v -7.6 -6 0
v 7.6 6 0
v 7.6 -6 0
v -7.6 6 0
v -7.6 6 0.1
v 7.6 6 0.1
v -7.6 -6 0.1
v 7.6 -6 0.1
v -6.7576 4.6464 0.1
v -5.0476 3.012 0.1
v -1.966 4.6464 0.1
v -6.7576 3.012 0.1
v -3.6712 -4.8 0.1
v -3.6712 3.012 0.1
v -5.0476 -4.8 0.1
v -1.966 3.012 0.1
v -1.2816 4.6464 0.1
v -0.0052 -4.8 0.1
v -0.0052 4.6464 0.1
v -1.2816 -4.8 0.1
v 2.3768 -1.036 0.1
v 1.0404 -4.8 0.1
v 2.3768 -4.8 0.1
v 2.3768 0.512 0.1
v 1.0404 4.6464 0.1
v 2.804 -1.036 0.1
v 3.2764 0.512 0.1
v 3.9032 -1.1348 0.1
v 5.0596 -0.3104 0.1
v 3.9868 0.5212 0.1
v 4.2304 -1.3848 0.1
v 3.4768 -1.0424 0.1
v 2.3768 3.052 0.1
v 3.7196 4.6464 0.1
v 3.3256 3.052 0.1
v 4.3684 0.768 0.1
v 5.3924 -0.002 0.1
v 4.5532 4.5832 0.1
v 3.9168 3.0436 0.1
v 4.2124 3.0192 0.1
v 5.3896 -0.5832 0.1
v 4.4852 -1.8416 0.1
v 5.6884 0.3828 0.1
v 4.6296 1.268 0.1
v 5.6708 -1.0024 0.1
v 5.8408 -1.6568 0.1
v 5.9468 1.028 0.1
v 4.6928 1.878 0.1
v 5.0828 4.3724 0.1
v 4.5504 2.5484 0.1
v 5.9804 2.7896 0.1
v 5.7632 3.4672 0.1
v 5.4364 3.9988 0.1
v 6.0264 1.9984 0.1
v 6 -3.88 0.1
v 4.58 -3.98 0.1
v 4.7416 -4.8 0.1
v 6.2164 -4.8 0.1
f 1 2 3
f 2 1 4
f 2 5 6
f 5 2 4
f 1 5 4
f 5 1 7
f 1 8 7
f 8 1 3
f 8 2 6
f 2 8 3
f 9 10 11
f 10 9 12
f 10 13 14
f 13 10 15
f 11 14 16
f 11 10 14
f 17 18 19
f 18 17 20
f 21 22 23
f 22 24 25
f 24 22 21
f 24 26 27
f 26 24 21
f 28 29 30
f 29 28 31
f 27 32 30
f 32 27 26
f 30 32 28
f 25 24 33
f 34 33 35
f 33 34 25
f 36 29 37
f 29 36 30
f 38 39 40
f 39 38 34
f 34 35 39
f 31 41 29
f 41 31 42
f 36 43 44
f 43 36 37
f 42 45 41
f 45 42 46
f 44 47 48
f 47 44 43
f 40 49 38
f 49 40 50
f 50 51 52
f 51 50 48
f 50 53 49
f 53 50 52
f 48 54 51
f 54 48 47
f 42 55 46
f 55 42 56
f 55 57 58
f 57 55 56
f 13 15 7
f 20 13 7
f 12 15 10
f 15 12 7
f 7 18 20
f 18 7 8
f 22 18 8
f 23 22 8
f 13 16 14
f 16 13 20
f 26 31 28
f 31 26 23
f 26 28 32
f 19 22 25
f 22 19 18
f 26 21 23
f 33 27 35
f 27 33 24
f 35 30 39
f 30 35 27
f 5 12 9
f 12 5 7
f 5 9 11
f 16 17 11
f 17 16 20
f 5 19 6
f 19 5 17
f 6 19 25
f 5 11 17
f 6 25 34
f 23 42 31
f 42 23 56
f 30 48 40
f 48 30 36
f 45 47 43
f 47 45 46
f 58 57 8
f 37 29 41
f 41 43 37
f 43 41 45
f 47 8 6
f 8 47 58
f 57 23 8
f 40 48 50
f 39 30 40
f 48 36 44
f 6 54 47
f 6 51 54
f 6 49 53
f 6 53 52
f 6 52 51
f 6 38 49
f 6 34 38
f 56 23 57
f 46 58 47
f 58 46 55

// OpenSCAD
// file: ../p/4-4edge.scad
use <../lib.scad>
$fa=1; $fs=0.2;
function ldraw_lib__4_4edge(realsolid=false) = [
// 0 Circle 1.0
// 0 Name: 4-4edge.dat
// 0 Author: James Jessiman
// 0 !LDRAW_ORG Primitive UPDATE 2017-01
// 0 !LICENSE Licensed under CC BY 2.0 and CC BY 4.0 : see CAreadme.txt
// 
// 0 BFC CERTIFY CCW
  [0,"BFC","CERTIFY"],
  [0,"BFC","CCW"],
// 
// 0 !HISTORY 1998-12-15 [PTadmin] Official Update 1998-10
// 0 !HISTORY 2005-12-28 [PTadmin] Official Update 2005-01
// 0 !HISTORY 2007-06-24 [PTadmin] Header formatted for Contributor Agreement
// 0 !HISTORY 2008-07-01 [PTadmin] Official Update 2008-01
// 0 !HISTORY 2017-01-15 [Steffen] BFCed
// 0 !HISTORY 2017-12-30 [PTadmin] Official Update 2017-01
// 
// 
// 2 24 1 0 0 0.9239 0 0.3827
  [2,24,1,0,0,0.9239,0,0.3827],
// 2 24 0.9239 0 0.3827 0.7071 0 0.7071
  [2,24,0.9239,0,0.3827,0.7071,0,0.7071],
// 2 24 0.7071 0 0.7071 0.3827 0 0.9239
  [2,24,0.7071,0,0.7071,0.3827,0,0.9239],
// 2 24 0.3827 0 0.9239 0 0 1
  [2,24,0.3827,0,0.9239,0,0,1],
// 2 24 0 0 1 -0.3827 0 0.9239
  [2,24,0,0,1,-0.3827,0,0.9239],
// 2 24 -0.3827 0 0.9239 -0.7071 0 0.7071
  [2,24,-0.3827,0,0.9239,-0.7071,0,0.7071],
// 2 24 -0.7071 0 0.7071 -0.9239 0 0.3827
  [2,24,-0.7071,0,0.7071,-0.9239,0,0.3827],
// 2 24 -0.9239 0 0.3827 -1 0 -0
  [2,24,-0.9239,0,0.3827,-1,0,-0],
// 2 24 -1 0 -0 -0.9239 0 -0.3827
  [2,24,-1,0,-0,-0.9239,0,-0.3827],
// 2 24 -0.9239 0 -0.3827 -0.7071 0 -0.7071
  [2,24,-0.9239,0,-0.3827,-0.7071,0,-0.7071],
// 2 24 -0.7071 0 -0.7071 -0.3827 0 -0.9239
  [2,24,-0.7071,0,-0.7071,-0.3827,0,-0.9239],
// 2 24 -0.3827 0 -0.9239 0 0 -1
  [2,24,-0.3827,0,-0.9239,0,0,-1],
// 2 24 0 0 -1 0.3827 0 -0.9239
  [2,24,0,0,-1,0.3827,0,-0.9239],
// 2 24 0.3827 0 -0.9239 0.7071 0 -0.7071
  [2,24,0.3827,0,-0.9239,0.7071,0,-0.7071],
// 2 24 0.7071 0 -0.7071 0.9239 0 -0.3827
  [2,24,0.7071,0,-0.7071,0.9239,0,-0.3827],
// 2 24 0.9239 0 -0.3827 1 0 0
  [2,24,0.9239,0,-0.3827,1,0,0],
];
module ldraw_lib__4_4edge(step=0, col=false, unit=2/5, alt=false, line=0.2, solid=!$preview)
    makepoly(ldraw_lib__4_4edge(solid), step=step, col=col, unit=unit, alt=alt, line=line, solid=solid);
ldraw_lib__4_4edge(line=0.2);
// file: ../p/4-4disc.scad
use <../lib.scad>
$fa=1; $fs=0.2;
function ldraw_lib__4_4disc(realsolid=false) = [
// 0 Disc 1.0
// 0 Name: 4-4disc.dat
// 0 Author: James Jessiman
// 0 !LDRAW_ORG Primitive UPDATE 2002-02
// 0 !LICENSE Licensed under CC BY 2.0 and CC BY 4.0 : see CAreadme.txt
// 
// 0 BFC CERTIFY CCW
  [0,"BFC","CERTIFY"],
  [0,"BFC","CCW"],
// 
// 0 !HISTORY 1998-12-15 [PTadmin] Official Update 1998-10
// 0 !HISTORY 2002-03-23 [sbliss] Added BFC statement
// 0 !HISTORY 2002-04-25 [PTadmin] Official Update 2002-02
// 0 !HISTORY 2007-06-24 [PTadmin] Header formatted for Contributor Agreement
// 0 !HISTORY 2008-07-01 [PTadmin] Official Update 2008-01
// 
// 
// 3 16 0 0 0 1 0 0 0.9239 0 0.3827
  [3,16,0,0,0,1,0,0,0.9239,0,0.3827],
// 3 16 0 0 0 0.9239 0 0.3827 0.7071 0 0.7071
  [3,16,0,0,0,0.9239,0,0.3827,0.7071,0,0.7071],
// 3 16 0 0 0 0.7071 0 0.7071 0.3827 0 0.9239
  [3,16,0,0,0,0.7071,0,0.7071,0.3827,0,0.9239],
// 3 16 0 0 0 0.3827 0 0.9239 0 0 1
  [3,16,0,0,0,0.3827,0,0.9239,0,0,1],
// 3 16 0 0 0 0 0 1 -0.3827 0 0.9239
  [3,16,0,0,0,0,0,1,-0.3827,0,0.9239],
// 3 16 0 0 0 -0.3827 0 0.9239 -0.7071 0 0.7071
  [3,16,0,0,0,-0.3827,0,0.9239,-0.7071,0,0.7071],
// 3 16 0 0 0 -0.7071 0 0.7071 -0.9239 0 0.3827
  [3,16,0,0,0,-0.7071,0,0.7071,-0.9239,0,0.3827],
// 3 16 0 0 0 -0.9239 0 0.3827 -1 0 -0
  [3,16,0,0,0,-0.9239,0,0.3827,-1,0,-0],
// 3 16 0 0 0 -1 0 -0 -0.9239 0 -0.3827
  [3,16,0,0,0,-1,0,-0,-0.9239,0,-0.3827],
// 3 16 0 0 0 -0.9239 0 -0.3827 -0.7071 0 -0.7071
  [3,16,0,0,0,-0.9239,0,-0.3827,-0.7071,0,-0.7071],
// 3 16 0 0 0 -0.7071 0 -0.7071 -0.3827 0 -0.9239
  [3,16,0,0,0,-0.7071,0,-0.7071,-0.3827,0,-0.9239],
// 3 16 0 0 0 -0.3827 0 -0.9239 0 0 -1
  [3,16,0,0,0,-0.3827,0,-0.9239,0,0,-1],
// 3 16 0 0 0 0 0 -1 0.3827 0 -0.9239
  [3,16,0,0,0,0,0,-1,0.3827,0,-0.9239],
// 3 16 0 0 0 0.3827 0 -0.9239 0.7071 0 -0.7071
  [3,16,0,0,0,0.3827,0,-0.9239,0.7071,0,-0.7071],
// 3 16 0 0 0 0.7071 0 -0.7071 0.9239 0 -0.3827
  [3,16,0,0,0,0.7071,0,-0.7071,0.9239,0,-0.3827],
// 3 16 0 0 0 0.9239 0 -0.3827 1 0 0
  [3,16,0,0,0,0.9239,0,-0.3827,1,0,0],
// 0
];
module ldraw_lib__4_4disc(step=0, col=false, unit=2/5, alt=false, line=0.2, solid=!$preview)
    makepoly(ldraw_lib__4_4disc(solid), step=step, col=col, unit=unit, alt=alt, line=line, solid=solid);
ldraw_lib__4_4disc(line=0.2);
// file: ../p/4-4cyli.scad
use <../lib.scad>
$fa=1; $fs=0.2;
function ldraw_lib__4_4cyli(realsolid=false) = [
// 0 Cylinder 1.0
// 0 Name: 4-4cyli.dat
// 0 Author: James Jessiman
// 0 !LDRAW_ORG Primitive UPDATE 2005-01
// 0 !LICENSE Licensed under CC BY 2.0 and CC BY 4.0 : see CAreadme.txt
// 
// 0 BFC CERTIFY CCW
  [0,"BFC","CERTIFY"],
  [0,"BFC","CCW"],
// 
// 0 !HISTORY 1998-12-15 [PTadmin] Official Update 1998-10
// 0 !HISTORY 2002-03-23 [sbliss] Added BFC statement; merged headers from files in distributions LDraw 0.27 and Complete.
// 0 !HISTORY 2002-04-25 [PTadmin] Official Update 2002-02
// 0 !HISTORY 2004-12-14 [guyvivan] BFC CCW
// 0 !HISTORY 2005-12-28 [PTadmin] Official Update 2005-01
// 0 !HISTORY 2007-06-24 [PTadmin] Header formatted for Contributor Agreement
// 0 !HISTORY 2008-07-01 [PTadmin] Official Update 2008-01
// 
// 
// 4 16 1 1 0 0.9239 1 0.3827 0.9239 0 0.3827 1 0 0
  [4,16,1,1,0,0.9239,1,0.3827,0.9239,0,0.3827,1,0,0],
// 5 24 1 0 0 1 1 0 0.9239 0 0.3827 0.9239 0 -0.3827
  [5,24,1,0,0,1,1,0,0.9239,0,0.3827,0.9239,0,-0.3827],
// 4 16 0.9239 1 0.3827 0.7071 1 0.7071 0.7071 0 0.7071 0.9239 0 0.3827
  [4,16,0.9239,1,0.3827,0.7071,1,0.7071,0.7071,0,0.7071,0.9239,0,0.3827],
// 5 24 0.9239 0 0.3827 0.9239 1 0.3827 0.7071 0 0.7071 1 0 0
  [5,24,0.9239,0,0.3827,0.9239,1,0.3827,0.7071,0,0.7071,1,0,0],
// 4 16 0.7071 1 0.7071 0.3827 1 0.9239 0.3827 0 0.9239 0.7071 0 0.7071
  [4,16,0.7071,1,0.7071,0.3827,1,0.9239,0.3827,0,0.9239,0.7071,0,0.7071],
// 5 24 0.7071 0 0.7071 0.7071 1 0.7071 0.3827 0 0.9239 0.9239 0 0.3827
  [5,24,0.7071,0,0.7071,0.7071,1,0.7071,0.3827,0,0.9239,0.9239,0,0.3827],
// 4 16 0.3827 1 0.9239 0 1 1 0 0 1 0.3827 0 0.9239
  [4,16,0.3827,1,0.9239,0,1,1,0,0,1,0.3827,0,0.9239],
// 5 24 0.3827 0 0.9239 0.3827 1 0.9239 0 0 1 0.7071 0 0.7071
  [5,24,0.3827,0,0.9239,0.3827,1,0.9239,0,0,1,0.7071,0,0.7071],
// 4 16 0 1 1 -0.3827 1 0.9239 -0.3827 0 0.9239 0 0 1
  [4,16,0,1,1,-0.3827,1,0.9239,-0.3827,0,0.9239,0,0,1],
// 5 24 0 0 1 0 1 1 -0.3827 0 0.9239 0.3827 0 0.9239
  [5,24,0,0,1,0,1,1,-0.3827,0,0.9239,0.3827,0,0.9239],
// 4 16 -0.3827 1 0.9239 -0.7071 1 0.7071 -0.7071 0 0.7071 -0.3827 0 0.9239
  [4,16,-0.3827,1,0.9239,-0.7071,1,0.7071,-0.7071,0,0.7071,-0.3827,0,0.9239],
// 5 24 -0.3827 0 0.9239 -0.3827 1 0.9239 -0.7071 0 0.7071 0 0 1
  [5,24,-0.3827,0,0.9239,-0.3827,1,0.9239,-0.7071,0,0.7071,0,0,1],
// 4 16 -0.7071 1 0.7071 -0.9239 1 0.3827 -0.9239 0 0.3827 -0.7071 0 0.7071
  [4,16,-0.7071,1,0.7071,-0.9239,1,0.3827,-0.9239,0,0.3827,-0.7071,0,0.7071],
// 5 24 -0.7071 0 0.7071 -0.7071 1 0.7071 -0.9239 0 0.3827 -0.3827 0 0.9239
  [5,24,-0.7071,0,0.7071,-0.7071,1,0.7071,-0.9239,0,0.3827,-0.3827,0,0.9239],
// 4 16 -0.9239 1 0.3827 -1 1 0 -1 0 0 -0.9239 0 0.3827
  [4,16,-0.9239,1,0.3827,-1,1,0,-1,0,0,-0.9239,0,0.3827],
// 5 24 -0.9239 0 0.3827 -0.9239 1 0.3827 -1 0 0 -0.7071 0 0.7071
  [5,24,-0.9239,0,0.3827,-0.9239,1,0.3827,-1,0,0,-0.7071,0,0.7071],
// 4 16 -1 1 0 -0.9239 1 -0.3827 -0.9239 0 -0.3827 -1 0 0
  [4,16,-1,1,0,-0.9239,1,-0.3827,-0.9239,0,-0.3827,-1,0,0],
// 5 24 -1 0 0 -1 1 0 -0.9239 0 -0.3827 -0.9239 0 0.3827
  [5,24,-1,0,0,-1,1,0,-0.9239,0,-0.3827,-0.9239,0,0.3827],
// 4 16 -0.9239 1 -0.3827 -0.7071 1 -0.7071 -0.7071 0 -0.7071 -0.9239 0 -0.3827
  [4,16,-0.9239,1,-0.3827,-0.7071,1,-0.7071,-0.7071,0,-0.7071,-0.9239,0,-0.3827],
// 5 24 -0.9239 0 -0.3827 -0.9239 1 -0.3827 -0.7071 0 -0.7071 -1 0 0
  [5,24,-0.9239,0,-0.3827,-0.9239,1,-0.3827,-0.7071,0,-0.7071,-1,0,0],
// 4 16 -0.7071 1 -0.7071 -0.3827 1 -0.9239 -0.3827 0 -0.9239 -0.7071 0 -0.7071
  [4,16,-0.7071,1,-0.7071,-0.3827,1,-0.9239,-0.3827,0,-0.9239,-0.7071,0,-0.7071],
// 5 24 -0.7071 0 -0.7071 -0.7071 1 -0.7071 -0.3827 0 -0.9239 -0.9239 0 -0.3827
  [5,24,-0.7071,0,-0.7071,-0.7071,1,-0.7071,-0.3827,0,-0.9239,-0.9239,0,-0.3827],
// 4 16 -0.3827 1 -0.9239 0 1 -1 0 0 -1 -0.3827 0 -0.9239
  [4,16,-0.3827,1,-0.9239,0,1,-1,0,0,-1,-0.3827,0,-0.9239],
// 5 24 -0.3827 0 -0.9239 -0.3827 1 -0.9239 0 0 -1 -0.7071 0 -0.7071
  [5,24,-0.3827,0,-0.9239,-0.3827,1,-0.9239,0,0,-1,-0.7071,0,-0.7071],
// 4 16 0 1 -1 0.3827 1 -0.9239 0.3827 0 -0.9239 0 0 -1
  [4,16,0,1,-1,0.3827,1,-0.9239,0.3827,0,-0.9239,0,0,-1],
// 5 24 0 0 -1 0 1 -1 0.3827 0 -0.9239 -0.3827 0 -0.9239
  [5,24,0,0,-1,0,1,-1,0.3827,0,-0.9239,-0.3827,0,-0.9239],
// 4 16 0.3827 1 -0.9239 0.7071 1 -0.7071 0.7071 0 -0.7071 0.3827 0 -0.9239
  [4,16,0.3827,1,-0.9239,0.7071,1,-0.7071,0.7071,0,-0.7071,0.3827,0,-0.9239],
// 5 24 0.3827 0 -0.9239 0.3827 1 -0.9239 0.7071 0 -0.7071 0 0 -1
  [5,24,0.3827,0,-0.9239,0.3827,1,-0.9239,0.7071,0,-0.7071,0,0,-1],
// 4 16 0.7071 1 -0.7071 0.9239 1 -0.3827 0.9239 0 -0.3827 0.7071 0 -0.7071
  [4,16,0.7071,1,-0.7071,0.9239,1,-0.3827,0.9239,0,-0.3827,0.7071,0,-0.7071],
// 5 24 0.7071 0 -0.7071 0.7071 1 -0.7071 0.9239 0 -0.3827 0.3827 0 -0.9239
  [5,24,0.7071,0,-0.7071,0.7071,1,-0.7071,0.9239,0,-0.3827,0.3827,0,-0.9239],
// 4 16 0.9239 1 -0.3827 1 1 0 1 0 0 0.9239 0 -0.3827
  [4,16,0.9239,1,-0.3827,1,1,0,1,0,0,0.9239,0,-0.3827],
// 5 24 0.9239 0 -0.3827 0.9239 1 -0.3827 1 0 0 0.7071 0 -0.7071
  [5,24,0.9239,0,-0.3827,0.9239,1,-0.3827,1,0,0,0.7071,0,-0.7071],
// 0
];
module ldraw_lib__4_4cyli(step=0, col=false, unit=2/5, alt=false, line=0.2, solid=!$preview)
    makepoly(ldraw_lib__4_4cyli(solid), step=step, col=col, unit=unit, alt=alt, line=line, solid=solid);
ldraw_lib__4_4cyli(line=0.2);
// file: ../p/stud3.scad
use <../lib.scad>
use <4-4cyli.scad>
use <4-4disc.scad>
use <4-4edge.scad>
$fa=1; $fs=0.2;
function ldraw_lib__stud3(realsolid=false) = realsolid ? 
    [openscad(translate([0,0,-eps()], o=cylinder(4+eps(), r=4)),2)] : [
// 0 Stud Tube Solid
// 0 Name: stud3.dat
// 0 Author: James Jessiman
// 0 !LDRAW_ORG Primitive UPDATE 2012-01
// 0 !LICENSE Licensed under CC BY 2.0 and CC BY 4.0 : see CAreadme.txt
// 
// 0 BFC CERTIFY CCW
  [0,"BFC","CERTIFY"],
  [0,"BFC","CCW"],
// 
// 0 !HISTORY 2002-04-04 [sbliss] Modified for BFC compliance
// 0 !HISTORY 2002-04-25 [PTadmin] Official Update 2002-02
// 0 !HISTORY 2007-06-24 [PTadmin] Header formatted for Contributor Agreement
// 0 !HISTORY 2008-07-01 [PTadmin] Official Update 2008-01
// 0 !HISTORY 2012-02-16 [Philo] Changed to CCW
// 0 !HISTORY 2012-03-30 [PTadmin] Official Update 2012-01
// 
// 
// 1 16 0 -4 0 4 0 0 0 1 0 0 0 4 4-4edge.dat
  [1,16,0,-4,0,4,0,0,0,1,0,0,0,4, ldraw_lib__4_4edge(realsolid)],
// 1 16 0 0 0 4 0 0 0 1 0 0 0 4 4-4edge.dat
  [1,16,0,0,0,4,0,0,0,1,0,0,0,4, ldraw_lib__4_4edge(realsolid)],
// 1 16 0 -4 0 4 0 0 0 1 0 0 0 4 4-4disc.dat
  [1,16,0,-4,0,4,0,0,0,1,0,0,0,4, ldraw_lib__4_4disc(realsolid)],
// 1 16 0 -4 0 4 0 0 0 4 0 0 0 4 4-4cyli.dat
  [1,16,0,-4,0,4,0,0,0,4,0,0,0,4, ldraw_lib__4_4cyli(realsolid)],
];
module ldraw_lib__stud3(step=0, col=false, unit=2/5, alt=false, line=0.2, solid=!$preview)
    makepoly(ldraw_lib__stud3(solid), step=step, col=col, unit=unit, alt=alt, line=line, solid=solid);
ldraw_lib__stud3(line=0.2);
// file: ../p/stud.scad
use <../lib.scad>
use <4-4cyli.scad>
use <4-4disc.scad>
use <4-4edge.scad>
$fa=1; $fs=0.2;
function ldraw_lib__stud(realsolid=false) = realsolid ? 
    [openscad(translate([0,0,-eps()], o=cylinder(4+eps(), r=6)),2)] : [
// 0 Stud
// 0 Name: stud.dat
// 0 Author: James Jessiman
// 0 !LDRAW_ORG Primitive UPDATE 2012-01
// 0 !LICENSE Licensed under CC BY 2.0 and CC BY 4.0 : see CAreadme.txt
// 
// 0 BFC CERTIFY CCW
  [0,"BFC","CERTIFY"],
  [0,"BFC","CCW"],
// 
// 0 !HISTORY 2002-04-04 [sbliss] Modified for BFC compliance
// 0 !HISTORY 2002-04-25 [PTadmin] Official Update 2002-02
// 0 !HISTORY 2007-06-24 [PTadmin] Header formatted for Contributor Agreement
// 0 !HISTORY 2008-07-01 [PTadmin] Official Update 2008-01
// 0 !HISTORY 2012-02-16 [Philo] Changed to CCW
// 0 !HISTORY 2012-03-30 [PTadmin] Official Update 2012-01
// 
// 
// 1 16 0 0 0 6 0 0 0 1 0 0 0 6 4-4edge.dat
  [1,16,0,0,0,6,0,0,0,1,0,0,0,6, ldraw_lib__4_4edge(realsolid)],
// 1 16 0 -4 0 6 0 0 0 1 0 0 0 6 4-4edge.dat
  [1,16,0,-4,0,6,0,0,0,1,0,0,0,6, ldraw_lib__4_4edge(realsolid)],
// 1 16 0 0 0 6 0 0 0 -4 0 0 0 6 4-4cyli.dat
  [1,16,0,0,0,6,0,0,0,-4,0,0,0,6, ldraw_lib__4_4cyli(realsolid)],
// 1 16 0 -4 0 6 0 0 0 1 0 0 0 6 4-4disc.dat
  [1,16,0,-4,0,6,0,0,0,1,0,0,0,6, ldraw_lib__4_4disc(realsolid)],
];
module ldraw_lib__stud(step=0, col=false, unit=2/5, alt=false, line=0.2, solid=!$preview)
    makepoly(ldraw_lib__stud(solid), step=step, col=col, unit=unit, alt=alt, line=line, solid=solid);
ldraw_lib__stud(line=0.2);
// file: ../p/box5.scad
use <../lib.scad>
$fa=1; $fs=0.2;
function ldraw_lib__box5(realsolid=false) = [
// 0 Box with 5 Faces and All Edges
// 0 Name: box5.dat
// 0 Author: James Jessiman
// 0 !LDRAW_ORG Primitive UPDATE 2012-01
// 0 !LICENSE Licensed under CC BY 2.0 and CC BY 4.0 : see CAreadme.txt
// 
// 0 BFC CERTIFY CCW
  [0,"BFC","CERTIFY"],
  [0,"BFC","CCW"],
// 
// 0 !HISTORY 2002-04-03 [sbliss] Modified for BFC compliance
// 0 !HISTORY 2002-04-25 [PTadmin] Official Update 2002-02
// 0 !HISTORY 2007-06-24 [PTadmin] Header formatted for Contributor Agreement
// 0 !HISTORY 2008-07-01 [PTadmin] Official Update 2008-01
// 0 !HISTORY 2012-02-16 [Philo] Changed to CCW
// 0 !HISTORY 2012-03-30 [PTadmin] Official Update 2012-01
// 
// 
// 2 24 1 1 1 -1 1 1
  [2,24,1,1,1,-1,1,1],
// 2 24 -1 1 1 -1 1 -1
  [2,24,-1,1,1,-1,1,-1],
// 2 24 -1 1 -1 1 1 -1
  [2,24,-1,1,-1,1,1,-1],
// 2 24 1 1 -1 1 1 1
  [2,24,1,1,-1,1,1,1],
// 2 24 1 0 1 -1 0 1
  [2,24,1,0,1,-1,0,1],
// 2 24 -1 0 1 -1 0 -1
  [2,24,-1,0,1,-1,0,-1],
// 2 24 -1 0 -1 1 0 -1
  [2,24,-1,0,-1,1,0,-1],
// 2 24 1 0 -1 1 0 1
  [2,24,1,0,-1,1,0,1],
// 2 24 1 0 1 1 1 1
  [2,24,1,0,1,1,1,1],
// 2 24 -1 0 1 -1 1 1
  [2,24,-1,0,1,-1,1,1],
// 2 24 1 0 -1 1 1 -1
  [2,24,1,0,-1,1,1,-1],
// 2 24 -1 0 -1 -1 1 -1
  [2,24,-1,0,-1,-1,1,-1],
// 4 16 -1 1 1 1 1 1 1 1 -1 -1 1 -1
  [4,16,-1,1,1,1,1,1,1,1,-1,-1,1,-1],
// 4 16 -1 1 1 -1 0 1 1 0 1 1 1 1
  [4,16,-1,1,1,-1,0,1,1,0,1,1,1,1],
// 4 16 -1 1 -1 -1 0 -1 -1 0 1 -1 1 1
  [4,16,-1,1,-1,-1,0,-1,-1,0,1,-1,1,1],
// 4 16 1 1 -1 1 0 -1 -1 0 -1 -1 1 -1
  [4,16,1,1,-1,1,0,-1,-1,0,-1,-1,1,-1],
// 4 16 1 1 1 1 0 1 1 0 -1 1 1 -1
  [4,16,1,1,1,1,0,1,1,0,-1,1,1,-1],
];
module ldraw_lib__box5(step=0, col=false, unit=2/5, alt=false, line=0.2, solid=!$preview)
    makepoly(ldraw_lib__box5(solid), step=step, col=col, unit=unit, alt=alt, line=line, solid=solid);
ldraw_lib__box5(line=0.2);
// file: ../p/box4t.scad
use <../lib.scad>
$fa=1; $fs=0.2;
function ldraw_lib__box4t(realsolid=false) = [
// 0 Box with 4 Adjacent Faces and All Edges
// 0 Name: box4t.dat
// 0 Author: Tore Eriksson [Tore_Eriksson]
// 0 !LDRAW_ORG Primitive UPDATE 2003-02
// 0 !LICENSE Licensed under CC BY 2.0 and CC BY 4.0 : see CAreadme.txt
// 
// 0 BFC CERTIFY CCW
  [0,"BFC","CERTIFY"],
  [0,"BFC","CCW"],
// 
// 0 !HISTORY 1997-09-29 [PTadmin] Official Update 1997-15
// 0 !HISTORY 2002-08-31 [izanette] Modified with WINDZ for BFC compliance
// 0 !HISTORY 2003-08-01 [PTadmin] Official Update 2003-02
// 0 !HISTORY 2007-06-24 [PTadmin] Header formatted for Contributor Agreement
// 0 !HISTORY 2008-07-01 [PTadmin] Official Update 2008-01
// 
// 
// 2 24 1 1 1 -1 1 1
  [2,24,1,1,1,-1,1,1],
// 2 24 -1 1 1 -1 1 -1
  [2,24,-1,1,1,-1,1,-1],
// 2 24 -1 1 -1 1 1 -1
  [2,24,-1,1,-1,1,1,-1],
// 2 24 1 1 -1 1 1 1
  [2,24,1,1,-1,1,1,1],
// 2 24 1 0 1 -1 0 1
  [2,24,1,0,1,-1,0,1],
// 2 24 -1 0 1 -1 0 -1
  [2,24,-1,0,1,-1,0,-1],
// 2 24 -1 0 -1 1 0 -1
  [2,24,-1,0,-1,1,0,-1],
// 2 24 1 0 -1 1 0 1
  [2,24,1,0,-1,1,0,1],
// 2 24 1 0 1 1 1 1
  [2,24,1,0,1,1,1,1],
// 2 24 -1 0 1 -1 1 1
  [2,24,-1,0,1,-1,1,1],
// 2 24 1 0 -1 1 1 -1
  [2,24,1,0,-1,1,1,-1],
// 2 24 -1 0 -1 -1 1 -1
  [2,24,-1,0,-1,-1,1,-1],
// 4 16 1 1 1 1 1 -1 -1 1 -1 -1 1 1
  [4,16,1,1,1,1,1,-1,-1,1,-1,-1,1,1],
// 4 16 1 1 1 -1 1 1 -1 0 1 1 0 1
  [4,16,1,1,1,-1,1,1,-1,0,1,1,0,1],
// 4 16 -1 1 1 -1 1 -1 -1 0 -1 -1 0 1
  [4,16,-1,1,1,-1,1,-1,-1,0,-1,-1,0,1],
// 0 4 16 -1 1 -1 -1 0 -1 1 0 -1 1 1 -1
// 4 16 1 1 -1 1 1 1 1 0 1 1 0 -1
  [4,16,1,1,-1,1,1,1,1,0,1,1,0,-1],
// 0
];
module ldraw_lib__box4t(step=0, col=false, unit=2/5, alt=false, line=0.2, solid=!$preview)
    makepoly(ldraw_lib__box4t(solid), step=step, col=col, unit=unit, alt=alt, line=line, solid=solid);
ldraw_lib__box4t(line=0.2);
// file: s/3004s01.scad
use <../../lib.scad>
use <../../p/box4t.scad>
use <../../p/box5.scad>
use <../../p/stud.scad>
use <../../p/stud3.scad>
$fa=1; $fs=0.2;
function ldraw_lib__s__3004s01(realsolid=false) = [
// 0 ~Brick  1 x  2 without Front Face
// 0 Name: s\3004s01.dat
// 0 Author: James Jessiman
// 0 !LDRAW_ORG Subpart UPDATE 2003-03
// 0 !LICENSE Licensed under CC BY 2.0 and CC BY 4.0 : see CAreadme.txt
// 
// 0 BFC CERTIFY CCW
  [0,"BFC","CERTIFY"],
  [0,"BFC","CCW"],
// 
// 0 !HISTORY 2003-09-07 [jriley] Subfiling, BFC
// 0 !HISTORY 2003-12-19 [PTadmin] Official Update 2003-03
// 0 !HISTORY 2007-08-29 [PTadmin] Header formatted for Contributor Agreement
// 0 !HISTORY 2008-07-01 [PTadmin] Official Update 2008-01
// 
// 
// 1 16 0 4 0 1 0 0 0 -5 0 0 0 1 stud3.dat
  [1,16,0,4,0,1,0,0,0,-5,0,0,0,1, ldraw_lib__stud3(realsolid)],
// 0 BFC INVERTNEXT
  [0,"BFC","INVERTNEXT"],
// 1 16 0 24 0 16 0 0 0 -20 0 0 0 6 box5.dat
  [1,16,0,24,0,16,0,0,0,-20,0,0,0,6, ldraw_lib__box5(realsolid)],
// 4 16 20 24 10 16 24 6 -16 24 6 -20 24 10
  [4,16,20,24,10,16,24,6,-16,24,6,-20,24,10],
// 4 16 -20 24 10 -16 24 6 -16 24 -6 -20 24 -10
  [4,16,-20,24,10,-16,24,6,-16,24,-6,-20,24,-10],
// 4 16 -20 24 -10 -16 24 -6 16 24 -6 20 24 -10
  [4,16,-20,24,-10,-16,24,-6,16,24,-6,20,24,-10],
// 4 16 20 24 -10 16 24 -6 16 24 6 20 24 10
  [4,16,20,24,-10,16,24,-6,16,24,6,20,24,10],
// 1 16 0 24 0 20 0 0 0 -24 0 0 0 10 box4t.dat
  [1,16,0,24,0,20,0,0,0,-24,0,0,0,10, ldraw_lib__box4t(realsolid)],
// 1 16 10 0 0 1 0 0 0 1 0 0 0 1 stud.dat
  [1,16,10,0,0,1,0,0,0,1,0,0,0,1, ldraw_lib__stud(realsolid)],
// 1 16 -10 0 0 1 0 0 0 1 0 0 0 1 stud.dat
  [1,16,-10,0,0,1,0,0,0,1,0,0,0,1, ldraw_lib__stud(realsolid)],
// 0
];
module ldraw_lib__s__3004s01(step=0, col=false, unit=2/5, alt=false, line=0.2, solid=!$preview)
    makepoly(ldraw_lib__s__3004s01(solid), step=step, col=col, unit=unit, alt=alt, line=line, solid=solid);
ldraw_lib__s__3004s01(line=0.2);
// file: 3004.scad
use <../lib.scad>
use <s/3004s01.scad>
$fa=1; $fs=0.2;
function ldraw_lib__3004(realsolid=false) = [
// 0 Brick  1 x  2
// 0 Name: 3004.dat
// 0 Author: James Jessiman
// 0 !LDRAW_ORG Part UPDATE 2022-05
// 0 !LICENSE Licensed under CC BY 2.0 and CC BY 4.0 : see CAreadme.txt
// 
// 0 BFC CERTIFY CCW
  [0,"BFC","CERTIFY"],
  [0,"BFC","CCW"],
// 
// 0 !HISTORY 2001-10-26 [PTadmin] Official Update 2001-01
// 0 !HISTORY 2002-05-07 {unknown} BFC Certification
// 0 !HISTORY 2002-06-11 [PTadmin] Official Update 2002-03
// 0 !HISTORY 2007-05-07 [PTadmin] Header formatted for Contributor Agreement
// 0 !HISTORY 2008-07-01 [PTadmin] Official Update 2008-01
// 0 !HISTORY 2022-08-04 [MagFors] Using subfile
// 0 !HISTORY 2022-09-15 [PTadmin] Official Update 2022-05
// 
// 
// 1 16 0 0 0 1 0 0 0 1 0 0 0 1 s\3004s01.dat
  [1,16,0,0,0,1,0,0,0,1,0,0,0,1, ldraw_lib__s__3004s01(realsolid)],
// 4 16 -20 24 -10 20 24 -10 20 0 -10 -20 0 -10
  [4,16,-20,24,-10,20,24,-10,20,0,-10,-20,0,-10],
];
module ldraw_lib__3004(step=0, col=false, unit=2/5, alt=false, line=0.2, solid=!$preview)
    makepoly(ldraw_lib__3004(solid), step=step, col=col, unit=unit, alt=alt, line=line, solid=solid);
ldraw_lib__3004(line=0.2);
// file: ../p/box5-12.scad
use <../lib.scad>
$fa=1; $fs=0.2;
function ldraw_lib__box5_12(realsolid=false) = [
// 0 Box with 5 Faces without Any Edges
// 0 Name: box5-12.dat
// 0 Author: Chris Dee [cwdee]
// 0 !LDRAW_ORG Primitive UPDATE 2009-02
// 0 !LICENSE Licensed under CC BY 2.0 and CC BY 4.0 : see CAreadme.txt
// 
// 0 BFC CERTIFY CCW
  [0,"BFC","CERTIFY"],
  [0,"BFC","CCW"],
// 
// 0 !HISTORY 2009-09-03 [PTadmin] Official Update 2009-02
// 
// 
// 4 16 1 1 1 1 1 -1 -1 1 -1 -1 1 1
  [4,16,1,1,1,1,1,-1,-1,1,-1,-1,1,1],
// 4 16 -1 0 1 1 0 1 1 1 1 -1 1 1
  [4,16,-1,0,1,1,0,1,1,1,1,-1,1,1],
// 4 16 -1 0 -1 -1 0 1 -1 1 1 -1 1 -1
  [4,16,-1,0,-1,-1,0,1,-1,1,1,-1,1,-1],
// 4 16 1 0 -1 -1 0 -1 -1 1 -1 1 1 -1
  [4,16,1,0,-1,-1,0,-1,-1,1,-1,1,1,-1],
// 4 16 1 0 1 1 0 -1 1 1 -1 1 1 1
  [4,16,1,0,1,1,0,-1,1,1,-1,1,1,1],
// 0
];
module ldraw_lib__box5_12(step=0, col=false, unit=2/5, alt=false, line=0.2, solid=!$preview)
    makepoly(ldraw_lib__box5_12(solid), step=step, col=col, unit=unit, alt=alt, line=line, solid=solid);
ldraw_lib__box5_12(line=0.2);
// main file
use <../lib.scad>
use <../p/box5-12.scad>
$fa=1; $fs=0.2;
function ldraw_lib__4100418g(realsolid=false) = [
// 0 Sticker  1.5 x  1.9 with "TIR"
// 0 Name: 4100418g.dat
// 0 Author: J.C. Tchang [tchang]
// 0 !LDRAW_ORG Part UPDATE 2013-01
// 0 !LICENSE Licensed under CC BY 2.0 and CC BY 4.0 : see CAreadme.txt
// 
// 0 BFC CERTIFY CCW
  [0,"BFC","CERTIFY"],
  [0,"BFC","CCW"],
// 
// 0 !KEYWORDS Set 5571
// 
// 0 !HISTORY 2013-07-21 [PTadmin] Official Update 2013-01
// 
// 
// 1 16 0 -0.25 0 19 0 0 0 0.25 0 0 0 15 box5-12.dat
  [1,16,0,-0.25,0,19,0,0,0,0.25,0,0,0,15, ldraw_lib__box5_12(realsolid)],
// 0 //
// 4 15 -12.619 -0.25 7.53 -4.915 -0.25 11.616 -16.894 -0.25 11.616 -16.894 -0.25 7.53
  [4,15,-12.619,-0.25,7.53,-4.915,-0.25,11.616,-16.894,-0.25,11.616,-16.894,-0.25,7.53],
// 4 15 -12.619 -0.25 7.53 -12.619 -0.25 -12 -9.178 -0.25 -12 -9.178 -0.25 7.53
  [4,15,-12.619,-0.25,7.53,-12.619,-0.25,-12,-9.178,-0.25,-12,-9.178,-0.25,7.53],
// 3 15 -4.915 -0.25 11.616 -9.178 -0.25 7.53 -4.915 -0.25 7.53
  [3,15,-4.915,-0.25,11.616,-9.178,-0.25,7.53,-4.915,-0.25,7.53],
// 3 15 -4.915 -0.25 11.616 -12.619 -0.25 7.53 -9.178 -0.25 7.53
  [3,15,-4.915,-0.25,11.616,-12.619,-0.25,7.53,-9.178,-0.25,7.53],
// 4 15 -3.204 -0.25 11.616 -3.204 -0.25 -12 -0.013 -0.25 -12 -0.013 -0.25 11.616
  [4,15,-3.204,-0.25,11.616,-3.204,-0.25,-12,-0.013,-0.25,-12,-0.013,-0.25,11.616],
// 3 15 5.942 -0.25 -2.59 2.601 -0.25 -12 5.942 -0.25 -12
  [3,15,5.942,-0.25,-2.59,2.601,-0.25,-12,5.942,-0.25,-12],
// 4 15 2.601 -0.25 -12 5.942 -0.25 -2.59 5.942 -0.25 1.28 2.601 -0.25 11.616
  [4,15,2.601,-0.25,-12,5.942,-0.25,-2.59,5.942,-0.25,1.28,2.601,-0.25,11.616],
// 4 15 5.942 -0.25 1.28 5.942 -0.25 -2.59 7.01 -0.25 -2.59 8.191 -0.25 1.28
  [4,15,5.942,-0.25,1.28,5.942,-0.25,-2.59,7.01,-0.25,-2.59,8.191,-0.25,1.28],
// 4 15 9.758 -0.25 -2.837 10.576 -0.25 -3.462 12.649 -0.25 -0.776 9.967 -0.25 1.303
  [4,15,9.758,-0.25,-2.837,10.576,-0.25,-3.462,12.649,-0.25,-0.776,9.967,-0.25,1.303],
// 4 15 8.191 -0.25 1.28 7.01 -0.25 -2.59 8.692 -0.25 -2.606 9.967 -0.25 1.303
  [4,15,8.191,-0.25,1.28,7.01,-0.25,-2.59,8.692,-0.25,-2.606,9.967,-0.25,1.303],
// 3 15 9.967 -0.25 1.303 8.692 -0.25 -2.606 9.758 -0.25 -2.837
  [3,15,9.967,-0.25,1.303,8.692,-0.25,-2.606,9.758,-0.25,-2.837],
// 3 15 2.601 -0.25 11.616 5.942 -0.25 1.28 5.942 -0.25 7.63
  [3,15,2.601,-0.25,11.616,5.942,-0.25,1.28,5.942,-0.25,7.63],
// 4 15 5.942 -0.25 7.63 8.314 -0.25 7.63 9.299 -0.25 11.616 2.601 -0.25 11.616
  [4,15,5.942,-0.25,7.63,8.314,-0.25,7.63,9.299,-0.25,11.616,2.601,-0.25,11.616],
// 4 15 10.921 -0.25 1.92 9.967 -0.25 1.303 12.649 -0.25 -0.776 13.481 -0.25 -0.005
  [4,15,10.921,-0.25,1.92,9.967,-0.25,1.303,12.649,-0.25,-0.776,13.481,-0.25,-0.005],
// 4 15 9.299 -0.25 11.616 9.792 -0.25 7.609 10.531 -0.25 7.548 11.383 -0.25 11.458
  [4,15,9.299,-0.25,11.616,9.792,-0.25,7.609,10.531,-0.25,7.548,11.383,-0.25,11.458],
// 3 15 9.299 -0.25 11.616 8.314 -0.25 7.63 9.792 -0.25 7.609
  [3,15,9.299,-0.25,11.616,8.314,-0.25,7.63,9.792,-0.25,7.609],
// 4 15 10.576 -0.25 -3.462 11.213 -0.25 -4.604 13.474 -0.25 -1.458 12.649 -0.25 -0.776
  [4,15,10.576,-0.25,-3.462,11.213,-0.25,-4.604,13.474,-0.25,-1.458,12.649,-0.25,-0.776],
// 4 15 11.574 -0.25 3.17 10.921 -0.25 1.92 13.481 -0.25 -0.005 14.221 -0.25 0.957
  [4,15,11.574,-0.25,3.17,10.921,-0.25,1.92,13.481,-0.25,-0.005,14.221,-0.25,0.957],
// 4 15 14.177 -0.25 -2.506 13.474 -0.25 -1.458 11.213 -0.25 -4.604 14.602 -0.25 -4.142
  [4,15,14.177,-0.25,-2.506,13.474,-0.25,-1.458,11.213,-0.25,-4.604,14.602,-0.25,-4.142],
// 4 15 11.574 -0.25 3.17 14.221 -0.25 0.957 14.867 -0.25 2.57 11.732 -0.25 4.695
  [4,15,11.574,-0.25,3.17,14.221,-0.25,0.957,14.867,-0.25,2.57,11.732,-0.25,4.695],
// 4 15 11.376 -0.25 6.371 12.707 -0.25 10.931 11.383 -0.25 11.458 10.531 -0.25 7.548
  [4,15,11.376,-0.25,6.371,12.707,-0.25,10.931,11.383,-0.25,11.458,10.531,-0.25,7.548],
// 4 15 11.376 -0.25 6.371 11.732 -0.25 4.695 14.951 -0.25 6.974 14.408 -0.25 8.668
  [4,15,11.376,-0.25,6.371,11.732,-0.25,4.695,14.951,-0.25,6.974,14.408,-0.25,8.668],
// 4 15 13.591 -0.25 9.997 12.707 -0.25 10.931 11.376 -0.25 6.371 14.408 -0.25 8.668
  [4,15,13.591,-0.25,9.997,12.707,-0.25,10.931,11.376,-0.25,6.371,14.408,-0.25,8.668],
// 4 15 15.066 -0.25 4.996 14.951 -0.25 6.974 11.732 -0.25 4.695 14.867 -0.25 2.57
  [4,15,15.066,-0.25,4.996,14.951,-0.25,6.974,11.732,-0.25,4.695,14.867,-0.25,2.57],
// 4 15 14.602 -0.25 -4.142 11.213 -0.25 -4.604 11.45 -0.25 -9.95 15 -0.25 -9.7
  [4,15,14.602,-0.25,-4.142,11.213,-0.25,-4.604,11.45,-0.25,-9.95,15,-0.25,-9.7],
// 4 15 15 -0.25 -9.7 11.45 -0.25 -9.95 11.854 -0.25 -12 15.541 -0.25 -12
  [4,15,15,-0.25,-9.7,11.45,-0.25,-9.95,11.854,-0.25,-12,15.541,-0.25,-12],
// 0 //
// 3 1 -9.178 -0.25 -12 -12.619 -0.25 -12 -19 -0.25 -15
  [3,1,-9.178,-0.25,-12,-12.619,-0.25,-12,-19,-0.25,-15],
// 3 1 -3.204 -0.25 -12 -9.178 -0.25 -12 -19 -0.25 -15
  [3,1,-3.204,-0.25,-12,-9.178,-0.25,-12,-19,-0.25,-15],
// 4 1 -16.894 -0.25 7.53 -19 -0.25 -15 -12.619 -0.25 -12 -12.619 -0.25 7.53
  [4,1,-16.894,-0.25,7.53,-19,-0.25,-15,-12.619,-0.25,-12,-12.619,-0.25,7.53],
// 4 1 -0.013 -0.25 -12 -3.204 -0.25 -12 -19 -0.25 -15 19 -0.25 -15
  [4,1,-0.013,-0.25,-12,-3.204,-0.25,-12,-19,-0.25,-15,19,-0.25,-15],
// 3 1 2.601 -0.25 -12 -0.013 -0.25 -12 19 -0.25 -15
  [3,1,2.601,-0.25,-12,-0.013,-0.25,-12,19,-0.25,-15],
// 3 1 5.942 -0.25 -12 2.601 -0.25 -12 19 -0.25 -15
  [3,1,5.942,-0.25,-12,2.601,-0.25,-12,19,-0.25,-15],
// 4 1 -9.178 -0.25 -12 -3.204 -0.25 -12 -4.915 -0.25 7.53 -9.178 -0.25 7.53
  [4,1,-9.178,-0.25,-12,-3.204,-0.25,-12,-4.915,-0.25,7.53,-9.178,-0.25,7.53],
// 4 1 10.576 -0.25 -3.462 9.758 -0.25 -2.837 7.01 -0.25 -2.59 5.942 -0.25 -12
  [4,1,10.576,-0.25,-3.462,9.758,-0.25,-2.837,7.01,-0.25,-2.59,5.942,-0.25,-12],
// 3 1 7.01 -0.25 -2.59 9.758 -0.25 -2.837 8.692 -0.25 -2.606
  [3,1,7.01,-0.25,-2.59,9.758,-0.25,-2.837,8.692,-0.25,-2.606],
// 4 1 -0.013 -0.25 11.616 -0.013 -0.25 -12 2.601 -0.25 -12 2.601 -0.25 11.616
  [4,1,-0.013,-0.25,11.616,-0.013,-0.25,-12,2.601,-0.25,-12,2.601,-0.25,11.616],
// 3 1 7.01 -0.25 -2.59 5.942 -0.25 -2.59 5.942 -0.25 -12
  [3,1,7.01,-0.25,-2.59,5.942,-0.25,-2.59,5.942,-0.25,-12],
// 4 1 5.942 -0.25 7.63 5.942 -0.25 1.28 8.191 -0.25 1.28 8.314 -0.25 7.63
  [4,1,5.942,-0.25,7.63,5.942,-0.25,1.28,8.191,-0.25,1.28,8.314,-0.25,7.63],
// 4 1 8.314 -0.25 7.63 8.191 -0.25 1.28 9.967 -0.25 1.303 9.792 -0.25 7.609
  [4,1,8.314,-0.25,7.63,8.191,-0.25,1.28,9.967,-0.25,1.303,9.792,-0.25,7.609],
// 4 1 -16.894 -0.25 7.53 -16.894 -0.25 11.616 -19 -0.25 15 -19 -0.25 -15
  [4,1,-16.894,-0.25,7.53,-16.894,-0.25,11.616,-19,-0.25,15,-19,-0.25,-15],
// 3 1 -19 -0.25 15 -16.894 -0.25 11.616 -4.915 -0.25 11.616
  [3,1,-19,-0.25,15,-16.894,-0.25,11.616,-4.915,-0.25,11.616],
// 4 1 -3.204 -0.25 11.616 -4.915 -0.25 11.616 -4.915 -0.25 7.53 -3.204 -0.25 -12
  [4,1,-3.204,-0.25,11.616,-4.915,-0.25,11.616,-4.915,-0.25,7.53,-3.204,-0.25,-12],
// 4 1 -19 -0.25 15 -3.204 -0.25 11.616 -0.013 -0.25 11.616 19 -0.25 15
  [4,1,-19,-0.25,15,-3.204,-0.25,11.616,-0.013,-0.25,11.616,19,-0.25,15],
// 3 1 19 -0.25 15 -0.013 -0.25 11.616 2.601 -0.25 11.616
  [3,1,19,-0.25,15,-0.013,-0.25,11.616,2.601,-0.25,11.616],
// 3 1 -19 -0.25 15 -4.915 -0.25 11.616 -3.204 -0.25 11.616
  [3,1,-19,-0.25,15,-4.915,-0.25,11.616,-3.204,-0.25,11.616],
// 3 1 19 -0.25 15 2.601 -0.25 11.616 9.299 -0.25 11.616
  [3,1,19,-0.25,15,2.601,-0.25,11.616,9.299,-0.25,11.616],
// 4 1 11.213 -0.25 -4.604 10.576 -0.25 -3.462 5.942 -0.25 -12 11.45 -0.25 -9.95
  [4,1,11.213,-0.25,-4.604,10.576,-0.25,-3.462,5.942,-0.25,-12,11.45,-0.25,-9.95],
// 4 1 10.531 -0.25 7.548 9.967 -0.25 1.303 10.921 -0.25 1.92 11.732 -0.25 4.695
  [4,1,10.531,-0.25,7.548,9.967,-0.25,1.303,10.921,-0.25,1.92,11.732,-0.25,4.695],
// 4 1 14.602 -0.25 -4.142 14.867 -0.25 2.57 14.221 -0.25 0.957 14.177 -0.25 -2.506
  [4,1,14.602,-0.25,-4.142,14.867,-0.25,2.57,14.221,-0.25,0.957,14.177,-0.25,-2.506],
// 3 1 15.541 -0.25 -12 11.854 -0.25 -12 19 -0.25 -15
  [3,1,15.541,-0.25,-12,11.854,-0.25,-12,19,-0.25,-15],
// 3 1 13.481 -0.25 -0.005 12.649 -0.25 -0.776 13.474 -0.25 -1.458
  [3,1,13.481,-0.25,-0.005,12.649,-0.25,-0.776,13.474,-0.25,-1.458],
// 4 1 14.221 -0.25 0.957 13.481 -0.25 -0.005 13.474 -0.25 -1.458 14.177 -0.25 -2.506
  [4,1,14.221,-0.25,0.957,13.481,-0.25,-0.005,13.474,-0.25,-1.458,14.177,-0.25,-2.506],
// 4 1 14.867 -0.25 2.57 15.541 -0.25 -12 19 -0.25 -15 19 -0.25 15
  [4,1,14.867,-0.25,2.57,15.541,-0.25,-12,19,-0.25,-15,19,-0.25,15],
// 3 1 11.854 -0.25 -12 5.942 -0.25 -12 19 -0.25 -15
  [3,1,11.854,-0.25,-12,5.942,-0.25,-12,19,-0.25,-15],
// 3 1 10.531 -0.25 7.548 11.732 -0.25 4.695 11.376 -0.25 6.371
  [3,1,10.531,-0.25,7.548,11.732,-0.25,4.695,11.376,-0.25,6.371],
// 3 1 9.792 -0.25 7.609 9.967 -0.25 1.303 10.531 -0.25 7.548
  [3,1,9.792,-0.25,7.609,9.967,-0.25,1.303,10.531,-0.25,7.548],
// 3 1 11.732 -0.25 4.695 10.921 -0.25 1.92 11.574 -0.25 3.17
  [3,1,11.732,-0.25,4.695,10.921,-0.25,1.92,11.574,-0.25,3.17],
// 3 1 19 -0.25 15 15.066 -0.25 4.996 14.867 -0.25 2.57
  [3,1,19,-0.25,15,15.066,-0.25,4.996,14.867,-0.25,2.57],
// 3 1 19 -0.25 15 14.951 -0.25 6.974 15.066 -0.25 4.996
  [3,1,19,-0.25,15,14.951,-0.25,6.974,15.066,-0.25,4.996],
// 3 1 19 -0.25 15 12.707 -0.25 10.931 13.591 -0.25 9.997
  [3,1,19,-0.25,15,12.707,-0.25,10.931,13.591,-0.25,9.997],
// 3 1 19 -0.25 15 13.591 -0.25 9.997 14.408 -0.25 8.668
  [3,1,19,-0.25,15,13.591,-0.25,9.997,14.408,-0.25,8.668],
// 3 1 19 -0.25 15 14.408 -0.25 8.668 14.951 -0.25 6.974
  [3,1,19,-0.25,15,14.408,-0.25,8.668,14.951,-0.25,6.974],
// 3 1 19 -0.25 15 11.383 -0.25 11.458 12.707 -0.25 10.931
  [3,1,19,-0.25,15,11.383,-0.25,11.458,12.707,-0.25,10.931],
// 3 1 19 -0.25 15 9.299 -0.25 11.616 11.383 -0.25 11.458
  [3,1,19,-0.25,15,9.299,-0.25,11.616,11.383,-0.25,11.458],
// 3 1 11.45 -0.25 -9.95 5.942 -0.25 -12 11.854 -0.25 -12
  [3,1,11.45,-0.25,-9.95,5.942,-0.25,-12,11.854,-0.25,-12],
// 4 1 14.602 -0.25 -4.142 15 -0.25 -9.7 15.541 -0.25 -12 14.867 -0.25 2.57
  [4,1,14.602,-0.25,-4.142,15,-0.25,-9.7,15.541,-0.25,-12,14.867,-0.25,2.57],
];
module ldraw_lib__4100418g(step=0, col=false, unit=2/5, alt=false, line=0.2, solid=!$preview)
    makepoly(ldraw_lib__4100418g(solid), step=step, col=col, unit=unit, alt=alt, line=line, solid=solid);
ldraw_lib__4100418g(line=0.2);
